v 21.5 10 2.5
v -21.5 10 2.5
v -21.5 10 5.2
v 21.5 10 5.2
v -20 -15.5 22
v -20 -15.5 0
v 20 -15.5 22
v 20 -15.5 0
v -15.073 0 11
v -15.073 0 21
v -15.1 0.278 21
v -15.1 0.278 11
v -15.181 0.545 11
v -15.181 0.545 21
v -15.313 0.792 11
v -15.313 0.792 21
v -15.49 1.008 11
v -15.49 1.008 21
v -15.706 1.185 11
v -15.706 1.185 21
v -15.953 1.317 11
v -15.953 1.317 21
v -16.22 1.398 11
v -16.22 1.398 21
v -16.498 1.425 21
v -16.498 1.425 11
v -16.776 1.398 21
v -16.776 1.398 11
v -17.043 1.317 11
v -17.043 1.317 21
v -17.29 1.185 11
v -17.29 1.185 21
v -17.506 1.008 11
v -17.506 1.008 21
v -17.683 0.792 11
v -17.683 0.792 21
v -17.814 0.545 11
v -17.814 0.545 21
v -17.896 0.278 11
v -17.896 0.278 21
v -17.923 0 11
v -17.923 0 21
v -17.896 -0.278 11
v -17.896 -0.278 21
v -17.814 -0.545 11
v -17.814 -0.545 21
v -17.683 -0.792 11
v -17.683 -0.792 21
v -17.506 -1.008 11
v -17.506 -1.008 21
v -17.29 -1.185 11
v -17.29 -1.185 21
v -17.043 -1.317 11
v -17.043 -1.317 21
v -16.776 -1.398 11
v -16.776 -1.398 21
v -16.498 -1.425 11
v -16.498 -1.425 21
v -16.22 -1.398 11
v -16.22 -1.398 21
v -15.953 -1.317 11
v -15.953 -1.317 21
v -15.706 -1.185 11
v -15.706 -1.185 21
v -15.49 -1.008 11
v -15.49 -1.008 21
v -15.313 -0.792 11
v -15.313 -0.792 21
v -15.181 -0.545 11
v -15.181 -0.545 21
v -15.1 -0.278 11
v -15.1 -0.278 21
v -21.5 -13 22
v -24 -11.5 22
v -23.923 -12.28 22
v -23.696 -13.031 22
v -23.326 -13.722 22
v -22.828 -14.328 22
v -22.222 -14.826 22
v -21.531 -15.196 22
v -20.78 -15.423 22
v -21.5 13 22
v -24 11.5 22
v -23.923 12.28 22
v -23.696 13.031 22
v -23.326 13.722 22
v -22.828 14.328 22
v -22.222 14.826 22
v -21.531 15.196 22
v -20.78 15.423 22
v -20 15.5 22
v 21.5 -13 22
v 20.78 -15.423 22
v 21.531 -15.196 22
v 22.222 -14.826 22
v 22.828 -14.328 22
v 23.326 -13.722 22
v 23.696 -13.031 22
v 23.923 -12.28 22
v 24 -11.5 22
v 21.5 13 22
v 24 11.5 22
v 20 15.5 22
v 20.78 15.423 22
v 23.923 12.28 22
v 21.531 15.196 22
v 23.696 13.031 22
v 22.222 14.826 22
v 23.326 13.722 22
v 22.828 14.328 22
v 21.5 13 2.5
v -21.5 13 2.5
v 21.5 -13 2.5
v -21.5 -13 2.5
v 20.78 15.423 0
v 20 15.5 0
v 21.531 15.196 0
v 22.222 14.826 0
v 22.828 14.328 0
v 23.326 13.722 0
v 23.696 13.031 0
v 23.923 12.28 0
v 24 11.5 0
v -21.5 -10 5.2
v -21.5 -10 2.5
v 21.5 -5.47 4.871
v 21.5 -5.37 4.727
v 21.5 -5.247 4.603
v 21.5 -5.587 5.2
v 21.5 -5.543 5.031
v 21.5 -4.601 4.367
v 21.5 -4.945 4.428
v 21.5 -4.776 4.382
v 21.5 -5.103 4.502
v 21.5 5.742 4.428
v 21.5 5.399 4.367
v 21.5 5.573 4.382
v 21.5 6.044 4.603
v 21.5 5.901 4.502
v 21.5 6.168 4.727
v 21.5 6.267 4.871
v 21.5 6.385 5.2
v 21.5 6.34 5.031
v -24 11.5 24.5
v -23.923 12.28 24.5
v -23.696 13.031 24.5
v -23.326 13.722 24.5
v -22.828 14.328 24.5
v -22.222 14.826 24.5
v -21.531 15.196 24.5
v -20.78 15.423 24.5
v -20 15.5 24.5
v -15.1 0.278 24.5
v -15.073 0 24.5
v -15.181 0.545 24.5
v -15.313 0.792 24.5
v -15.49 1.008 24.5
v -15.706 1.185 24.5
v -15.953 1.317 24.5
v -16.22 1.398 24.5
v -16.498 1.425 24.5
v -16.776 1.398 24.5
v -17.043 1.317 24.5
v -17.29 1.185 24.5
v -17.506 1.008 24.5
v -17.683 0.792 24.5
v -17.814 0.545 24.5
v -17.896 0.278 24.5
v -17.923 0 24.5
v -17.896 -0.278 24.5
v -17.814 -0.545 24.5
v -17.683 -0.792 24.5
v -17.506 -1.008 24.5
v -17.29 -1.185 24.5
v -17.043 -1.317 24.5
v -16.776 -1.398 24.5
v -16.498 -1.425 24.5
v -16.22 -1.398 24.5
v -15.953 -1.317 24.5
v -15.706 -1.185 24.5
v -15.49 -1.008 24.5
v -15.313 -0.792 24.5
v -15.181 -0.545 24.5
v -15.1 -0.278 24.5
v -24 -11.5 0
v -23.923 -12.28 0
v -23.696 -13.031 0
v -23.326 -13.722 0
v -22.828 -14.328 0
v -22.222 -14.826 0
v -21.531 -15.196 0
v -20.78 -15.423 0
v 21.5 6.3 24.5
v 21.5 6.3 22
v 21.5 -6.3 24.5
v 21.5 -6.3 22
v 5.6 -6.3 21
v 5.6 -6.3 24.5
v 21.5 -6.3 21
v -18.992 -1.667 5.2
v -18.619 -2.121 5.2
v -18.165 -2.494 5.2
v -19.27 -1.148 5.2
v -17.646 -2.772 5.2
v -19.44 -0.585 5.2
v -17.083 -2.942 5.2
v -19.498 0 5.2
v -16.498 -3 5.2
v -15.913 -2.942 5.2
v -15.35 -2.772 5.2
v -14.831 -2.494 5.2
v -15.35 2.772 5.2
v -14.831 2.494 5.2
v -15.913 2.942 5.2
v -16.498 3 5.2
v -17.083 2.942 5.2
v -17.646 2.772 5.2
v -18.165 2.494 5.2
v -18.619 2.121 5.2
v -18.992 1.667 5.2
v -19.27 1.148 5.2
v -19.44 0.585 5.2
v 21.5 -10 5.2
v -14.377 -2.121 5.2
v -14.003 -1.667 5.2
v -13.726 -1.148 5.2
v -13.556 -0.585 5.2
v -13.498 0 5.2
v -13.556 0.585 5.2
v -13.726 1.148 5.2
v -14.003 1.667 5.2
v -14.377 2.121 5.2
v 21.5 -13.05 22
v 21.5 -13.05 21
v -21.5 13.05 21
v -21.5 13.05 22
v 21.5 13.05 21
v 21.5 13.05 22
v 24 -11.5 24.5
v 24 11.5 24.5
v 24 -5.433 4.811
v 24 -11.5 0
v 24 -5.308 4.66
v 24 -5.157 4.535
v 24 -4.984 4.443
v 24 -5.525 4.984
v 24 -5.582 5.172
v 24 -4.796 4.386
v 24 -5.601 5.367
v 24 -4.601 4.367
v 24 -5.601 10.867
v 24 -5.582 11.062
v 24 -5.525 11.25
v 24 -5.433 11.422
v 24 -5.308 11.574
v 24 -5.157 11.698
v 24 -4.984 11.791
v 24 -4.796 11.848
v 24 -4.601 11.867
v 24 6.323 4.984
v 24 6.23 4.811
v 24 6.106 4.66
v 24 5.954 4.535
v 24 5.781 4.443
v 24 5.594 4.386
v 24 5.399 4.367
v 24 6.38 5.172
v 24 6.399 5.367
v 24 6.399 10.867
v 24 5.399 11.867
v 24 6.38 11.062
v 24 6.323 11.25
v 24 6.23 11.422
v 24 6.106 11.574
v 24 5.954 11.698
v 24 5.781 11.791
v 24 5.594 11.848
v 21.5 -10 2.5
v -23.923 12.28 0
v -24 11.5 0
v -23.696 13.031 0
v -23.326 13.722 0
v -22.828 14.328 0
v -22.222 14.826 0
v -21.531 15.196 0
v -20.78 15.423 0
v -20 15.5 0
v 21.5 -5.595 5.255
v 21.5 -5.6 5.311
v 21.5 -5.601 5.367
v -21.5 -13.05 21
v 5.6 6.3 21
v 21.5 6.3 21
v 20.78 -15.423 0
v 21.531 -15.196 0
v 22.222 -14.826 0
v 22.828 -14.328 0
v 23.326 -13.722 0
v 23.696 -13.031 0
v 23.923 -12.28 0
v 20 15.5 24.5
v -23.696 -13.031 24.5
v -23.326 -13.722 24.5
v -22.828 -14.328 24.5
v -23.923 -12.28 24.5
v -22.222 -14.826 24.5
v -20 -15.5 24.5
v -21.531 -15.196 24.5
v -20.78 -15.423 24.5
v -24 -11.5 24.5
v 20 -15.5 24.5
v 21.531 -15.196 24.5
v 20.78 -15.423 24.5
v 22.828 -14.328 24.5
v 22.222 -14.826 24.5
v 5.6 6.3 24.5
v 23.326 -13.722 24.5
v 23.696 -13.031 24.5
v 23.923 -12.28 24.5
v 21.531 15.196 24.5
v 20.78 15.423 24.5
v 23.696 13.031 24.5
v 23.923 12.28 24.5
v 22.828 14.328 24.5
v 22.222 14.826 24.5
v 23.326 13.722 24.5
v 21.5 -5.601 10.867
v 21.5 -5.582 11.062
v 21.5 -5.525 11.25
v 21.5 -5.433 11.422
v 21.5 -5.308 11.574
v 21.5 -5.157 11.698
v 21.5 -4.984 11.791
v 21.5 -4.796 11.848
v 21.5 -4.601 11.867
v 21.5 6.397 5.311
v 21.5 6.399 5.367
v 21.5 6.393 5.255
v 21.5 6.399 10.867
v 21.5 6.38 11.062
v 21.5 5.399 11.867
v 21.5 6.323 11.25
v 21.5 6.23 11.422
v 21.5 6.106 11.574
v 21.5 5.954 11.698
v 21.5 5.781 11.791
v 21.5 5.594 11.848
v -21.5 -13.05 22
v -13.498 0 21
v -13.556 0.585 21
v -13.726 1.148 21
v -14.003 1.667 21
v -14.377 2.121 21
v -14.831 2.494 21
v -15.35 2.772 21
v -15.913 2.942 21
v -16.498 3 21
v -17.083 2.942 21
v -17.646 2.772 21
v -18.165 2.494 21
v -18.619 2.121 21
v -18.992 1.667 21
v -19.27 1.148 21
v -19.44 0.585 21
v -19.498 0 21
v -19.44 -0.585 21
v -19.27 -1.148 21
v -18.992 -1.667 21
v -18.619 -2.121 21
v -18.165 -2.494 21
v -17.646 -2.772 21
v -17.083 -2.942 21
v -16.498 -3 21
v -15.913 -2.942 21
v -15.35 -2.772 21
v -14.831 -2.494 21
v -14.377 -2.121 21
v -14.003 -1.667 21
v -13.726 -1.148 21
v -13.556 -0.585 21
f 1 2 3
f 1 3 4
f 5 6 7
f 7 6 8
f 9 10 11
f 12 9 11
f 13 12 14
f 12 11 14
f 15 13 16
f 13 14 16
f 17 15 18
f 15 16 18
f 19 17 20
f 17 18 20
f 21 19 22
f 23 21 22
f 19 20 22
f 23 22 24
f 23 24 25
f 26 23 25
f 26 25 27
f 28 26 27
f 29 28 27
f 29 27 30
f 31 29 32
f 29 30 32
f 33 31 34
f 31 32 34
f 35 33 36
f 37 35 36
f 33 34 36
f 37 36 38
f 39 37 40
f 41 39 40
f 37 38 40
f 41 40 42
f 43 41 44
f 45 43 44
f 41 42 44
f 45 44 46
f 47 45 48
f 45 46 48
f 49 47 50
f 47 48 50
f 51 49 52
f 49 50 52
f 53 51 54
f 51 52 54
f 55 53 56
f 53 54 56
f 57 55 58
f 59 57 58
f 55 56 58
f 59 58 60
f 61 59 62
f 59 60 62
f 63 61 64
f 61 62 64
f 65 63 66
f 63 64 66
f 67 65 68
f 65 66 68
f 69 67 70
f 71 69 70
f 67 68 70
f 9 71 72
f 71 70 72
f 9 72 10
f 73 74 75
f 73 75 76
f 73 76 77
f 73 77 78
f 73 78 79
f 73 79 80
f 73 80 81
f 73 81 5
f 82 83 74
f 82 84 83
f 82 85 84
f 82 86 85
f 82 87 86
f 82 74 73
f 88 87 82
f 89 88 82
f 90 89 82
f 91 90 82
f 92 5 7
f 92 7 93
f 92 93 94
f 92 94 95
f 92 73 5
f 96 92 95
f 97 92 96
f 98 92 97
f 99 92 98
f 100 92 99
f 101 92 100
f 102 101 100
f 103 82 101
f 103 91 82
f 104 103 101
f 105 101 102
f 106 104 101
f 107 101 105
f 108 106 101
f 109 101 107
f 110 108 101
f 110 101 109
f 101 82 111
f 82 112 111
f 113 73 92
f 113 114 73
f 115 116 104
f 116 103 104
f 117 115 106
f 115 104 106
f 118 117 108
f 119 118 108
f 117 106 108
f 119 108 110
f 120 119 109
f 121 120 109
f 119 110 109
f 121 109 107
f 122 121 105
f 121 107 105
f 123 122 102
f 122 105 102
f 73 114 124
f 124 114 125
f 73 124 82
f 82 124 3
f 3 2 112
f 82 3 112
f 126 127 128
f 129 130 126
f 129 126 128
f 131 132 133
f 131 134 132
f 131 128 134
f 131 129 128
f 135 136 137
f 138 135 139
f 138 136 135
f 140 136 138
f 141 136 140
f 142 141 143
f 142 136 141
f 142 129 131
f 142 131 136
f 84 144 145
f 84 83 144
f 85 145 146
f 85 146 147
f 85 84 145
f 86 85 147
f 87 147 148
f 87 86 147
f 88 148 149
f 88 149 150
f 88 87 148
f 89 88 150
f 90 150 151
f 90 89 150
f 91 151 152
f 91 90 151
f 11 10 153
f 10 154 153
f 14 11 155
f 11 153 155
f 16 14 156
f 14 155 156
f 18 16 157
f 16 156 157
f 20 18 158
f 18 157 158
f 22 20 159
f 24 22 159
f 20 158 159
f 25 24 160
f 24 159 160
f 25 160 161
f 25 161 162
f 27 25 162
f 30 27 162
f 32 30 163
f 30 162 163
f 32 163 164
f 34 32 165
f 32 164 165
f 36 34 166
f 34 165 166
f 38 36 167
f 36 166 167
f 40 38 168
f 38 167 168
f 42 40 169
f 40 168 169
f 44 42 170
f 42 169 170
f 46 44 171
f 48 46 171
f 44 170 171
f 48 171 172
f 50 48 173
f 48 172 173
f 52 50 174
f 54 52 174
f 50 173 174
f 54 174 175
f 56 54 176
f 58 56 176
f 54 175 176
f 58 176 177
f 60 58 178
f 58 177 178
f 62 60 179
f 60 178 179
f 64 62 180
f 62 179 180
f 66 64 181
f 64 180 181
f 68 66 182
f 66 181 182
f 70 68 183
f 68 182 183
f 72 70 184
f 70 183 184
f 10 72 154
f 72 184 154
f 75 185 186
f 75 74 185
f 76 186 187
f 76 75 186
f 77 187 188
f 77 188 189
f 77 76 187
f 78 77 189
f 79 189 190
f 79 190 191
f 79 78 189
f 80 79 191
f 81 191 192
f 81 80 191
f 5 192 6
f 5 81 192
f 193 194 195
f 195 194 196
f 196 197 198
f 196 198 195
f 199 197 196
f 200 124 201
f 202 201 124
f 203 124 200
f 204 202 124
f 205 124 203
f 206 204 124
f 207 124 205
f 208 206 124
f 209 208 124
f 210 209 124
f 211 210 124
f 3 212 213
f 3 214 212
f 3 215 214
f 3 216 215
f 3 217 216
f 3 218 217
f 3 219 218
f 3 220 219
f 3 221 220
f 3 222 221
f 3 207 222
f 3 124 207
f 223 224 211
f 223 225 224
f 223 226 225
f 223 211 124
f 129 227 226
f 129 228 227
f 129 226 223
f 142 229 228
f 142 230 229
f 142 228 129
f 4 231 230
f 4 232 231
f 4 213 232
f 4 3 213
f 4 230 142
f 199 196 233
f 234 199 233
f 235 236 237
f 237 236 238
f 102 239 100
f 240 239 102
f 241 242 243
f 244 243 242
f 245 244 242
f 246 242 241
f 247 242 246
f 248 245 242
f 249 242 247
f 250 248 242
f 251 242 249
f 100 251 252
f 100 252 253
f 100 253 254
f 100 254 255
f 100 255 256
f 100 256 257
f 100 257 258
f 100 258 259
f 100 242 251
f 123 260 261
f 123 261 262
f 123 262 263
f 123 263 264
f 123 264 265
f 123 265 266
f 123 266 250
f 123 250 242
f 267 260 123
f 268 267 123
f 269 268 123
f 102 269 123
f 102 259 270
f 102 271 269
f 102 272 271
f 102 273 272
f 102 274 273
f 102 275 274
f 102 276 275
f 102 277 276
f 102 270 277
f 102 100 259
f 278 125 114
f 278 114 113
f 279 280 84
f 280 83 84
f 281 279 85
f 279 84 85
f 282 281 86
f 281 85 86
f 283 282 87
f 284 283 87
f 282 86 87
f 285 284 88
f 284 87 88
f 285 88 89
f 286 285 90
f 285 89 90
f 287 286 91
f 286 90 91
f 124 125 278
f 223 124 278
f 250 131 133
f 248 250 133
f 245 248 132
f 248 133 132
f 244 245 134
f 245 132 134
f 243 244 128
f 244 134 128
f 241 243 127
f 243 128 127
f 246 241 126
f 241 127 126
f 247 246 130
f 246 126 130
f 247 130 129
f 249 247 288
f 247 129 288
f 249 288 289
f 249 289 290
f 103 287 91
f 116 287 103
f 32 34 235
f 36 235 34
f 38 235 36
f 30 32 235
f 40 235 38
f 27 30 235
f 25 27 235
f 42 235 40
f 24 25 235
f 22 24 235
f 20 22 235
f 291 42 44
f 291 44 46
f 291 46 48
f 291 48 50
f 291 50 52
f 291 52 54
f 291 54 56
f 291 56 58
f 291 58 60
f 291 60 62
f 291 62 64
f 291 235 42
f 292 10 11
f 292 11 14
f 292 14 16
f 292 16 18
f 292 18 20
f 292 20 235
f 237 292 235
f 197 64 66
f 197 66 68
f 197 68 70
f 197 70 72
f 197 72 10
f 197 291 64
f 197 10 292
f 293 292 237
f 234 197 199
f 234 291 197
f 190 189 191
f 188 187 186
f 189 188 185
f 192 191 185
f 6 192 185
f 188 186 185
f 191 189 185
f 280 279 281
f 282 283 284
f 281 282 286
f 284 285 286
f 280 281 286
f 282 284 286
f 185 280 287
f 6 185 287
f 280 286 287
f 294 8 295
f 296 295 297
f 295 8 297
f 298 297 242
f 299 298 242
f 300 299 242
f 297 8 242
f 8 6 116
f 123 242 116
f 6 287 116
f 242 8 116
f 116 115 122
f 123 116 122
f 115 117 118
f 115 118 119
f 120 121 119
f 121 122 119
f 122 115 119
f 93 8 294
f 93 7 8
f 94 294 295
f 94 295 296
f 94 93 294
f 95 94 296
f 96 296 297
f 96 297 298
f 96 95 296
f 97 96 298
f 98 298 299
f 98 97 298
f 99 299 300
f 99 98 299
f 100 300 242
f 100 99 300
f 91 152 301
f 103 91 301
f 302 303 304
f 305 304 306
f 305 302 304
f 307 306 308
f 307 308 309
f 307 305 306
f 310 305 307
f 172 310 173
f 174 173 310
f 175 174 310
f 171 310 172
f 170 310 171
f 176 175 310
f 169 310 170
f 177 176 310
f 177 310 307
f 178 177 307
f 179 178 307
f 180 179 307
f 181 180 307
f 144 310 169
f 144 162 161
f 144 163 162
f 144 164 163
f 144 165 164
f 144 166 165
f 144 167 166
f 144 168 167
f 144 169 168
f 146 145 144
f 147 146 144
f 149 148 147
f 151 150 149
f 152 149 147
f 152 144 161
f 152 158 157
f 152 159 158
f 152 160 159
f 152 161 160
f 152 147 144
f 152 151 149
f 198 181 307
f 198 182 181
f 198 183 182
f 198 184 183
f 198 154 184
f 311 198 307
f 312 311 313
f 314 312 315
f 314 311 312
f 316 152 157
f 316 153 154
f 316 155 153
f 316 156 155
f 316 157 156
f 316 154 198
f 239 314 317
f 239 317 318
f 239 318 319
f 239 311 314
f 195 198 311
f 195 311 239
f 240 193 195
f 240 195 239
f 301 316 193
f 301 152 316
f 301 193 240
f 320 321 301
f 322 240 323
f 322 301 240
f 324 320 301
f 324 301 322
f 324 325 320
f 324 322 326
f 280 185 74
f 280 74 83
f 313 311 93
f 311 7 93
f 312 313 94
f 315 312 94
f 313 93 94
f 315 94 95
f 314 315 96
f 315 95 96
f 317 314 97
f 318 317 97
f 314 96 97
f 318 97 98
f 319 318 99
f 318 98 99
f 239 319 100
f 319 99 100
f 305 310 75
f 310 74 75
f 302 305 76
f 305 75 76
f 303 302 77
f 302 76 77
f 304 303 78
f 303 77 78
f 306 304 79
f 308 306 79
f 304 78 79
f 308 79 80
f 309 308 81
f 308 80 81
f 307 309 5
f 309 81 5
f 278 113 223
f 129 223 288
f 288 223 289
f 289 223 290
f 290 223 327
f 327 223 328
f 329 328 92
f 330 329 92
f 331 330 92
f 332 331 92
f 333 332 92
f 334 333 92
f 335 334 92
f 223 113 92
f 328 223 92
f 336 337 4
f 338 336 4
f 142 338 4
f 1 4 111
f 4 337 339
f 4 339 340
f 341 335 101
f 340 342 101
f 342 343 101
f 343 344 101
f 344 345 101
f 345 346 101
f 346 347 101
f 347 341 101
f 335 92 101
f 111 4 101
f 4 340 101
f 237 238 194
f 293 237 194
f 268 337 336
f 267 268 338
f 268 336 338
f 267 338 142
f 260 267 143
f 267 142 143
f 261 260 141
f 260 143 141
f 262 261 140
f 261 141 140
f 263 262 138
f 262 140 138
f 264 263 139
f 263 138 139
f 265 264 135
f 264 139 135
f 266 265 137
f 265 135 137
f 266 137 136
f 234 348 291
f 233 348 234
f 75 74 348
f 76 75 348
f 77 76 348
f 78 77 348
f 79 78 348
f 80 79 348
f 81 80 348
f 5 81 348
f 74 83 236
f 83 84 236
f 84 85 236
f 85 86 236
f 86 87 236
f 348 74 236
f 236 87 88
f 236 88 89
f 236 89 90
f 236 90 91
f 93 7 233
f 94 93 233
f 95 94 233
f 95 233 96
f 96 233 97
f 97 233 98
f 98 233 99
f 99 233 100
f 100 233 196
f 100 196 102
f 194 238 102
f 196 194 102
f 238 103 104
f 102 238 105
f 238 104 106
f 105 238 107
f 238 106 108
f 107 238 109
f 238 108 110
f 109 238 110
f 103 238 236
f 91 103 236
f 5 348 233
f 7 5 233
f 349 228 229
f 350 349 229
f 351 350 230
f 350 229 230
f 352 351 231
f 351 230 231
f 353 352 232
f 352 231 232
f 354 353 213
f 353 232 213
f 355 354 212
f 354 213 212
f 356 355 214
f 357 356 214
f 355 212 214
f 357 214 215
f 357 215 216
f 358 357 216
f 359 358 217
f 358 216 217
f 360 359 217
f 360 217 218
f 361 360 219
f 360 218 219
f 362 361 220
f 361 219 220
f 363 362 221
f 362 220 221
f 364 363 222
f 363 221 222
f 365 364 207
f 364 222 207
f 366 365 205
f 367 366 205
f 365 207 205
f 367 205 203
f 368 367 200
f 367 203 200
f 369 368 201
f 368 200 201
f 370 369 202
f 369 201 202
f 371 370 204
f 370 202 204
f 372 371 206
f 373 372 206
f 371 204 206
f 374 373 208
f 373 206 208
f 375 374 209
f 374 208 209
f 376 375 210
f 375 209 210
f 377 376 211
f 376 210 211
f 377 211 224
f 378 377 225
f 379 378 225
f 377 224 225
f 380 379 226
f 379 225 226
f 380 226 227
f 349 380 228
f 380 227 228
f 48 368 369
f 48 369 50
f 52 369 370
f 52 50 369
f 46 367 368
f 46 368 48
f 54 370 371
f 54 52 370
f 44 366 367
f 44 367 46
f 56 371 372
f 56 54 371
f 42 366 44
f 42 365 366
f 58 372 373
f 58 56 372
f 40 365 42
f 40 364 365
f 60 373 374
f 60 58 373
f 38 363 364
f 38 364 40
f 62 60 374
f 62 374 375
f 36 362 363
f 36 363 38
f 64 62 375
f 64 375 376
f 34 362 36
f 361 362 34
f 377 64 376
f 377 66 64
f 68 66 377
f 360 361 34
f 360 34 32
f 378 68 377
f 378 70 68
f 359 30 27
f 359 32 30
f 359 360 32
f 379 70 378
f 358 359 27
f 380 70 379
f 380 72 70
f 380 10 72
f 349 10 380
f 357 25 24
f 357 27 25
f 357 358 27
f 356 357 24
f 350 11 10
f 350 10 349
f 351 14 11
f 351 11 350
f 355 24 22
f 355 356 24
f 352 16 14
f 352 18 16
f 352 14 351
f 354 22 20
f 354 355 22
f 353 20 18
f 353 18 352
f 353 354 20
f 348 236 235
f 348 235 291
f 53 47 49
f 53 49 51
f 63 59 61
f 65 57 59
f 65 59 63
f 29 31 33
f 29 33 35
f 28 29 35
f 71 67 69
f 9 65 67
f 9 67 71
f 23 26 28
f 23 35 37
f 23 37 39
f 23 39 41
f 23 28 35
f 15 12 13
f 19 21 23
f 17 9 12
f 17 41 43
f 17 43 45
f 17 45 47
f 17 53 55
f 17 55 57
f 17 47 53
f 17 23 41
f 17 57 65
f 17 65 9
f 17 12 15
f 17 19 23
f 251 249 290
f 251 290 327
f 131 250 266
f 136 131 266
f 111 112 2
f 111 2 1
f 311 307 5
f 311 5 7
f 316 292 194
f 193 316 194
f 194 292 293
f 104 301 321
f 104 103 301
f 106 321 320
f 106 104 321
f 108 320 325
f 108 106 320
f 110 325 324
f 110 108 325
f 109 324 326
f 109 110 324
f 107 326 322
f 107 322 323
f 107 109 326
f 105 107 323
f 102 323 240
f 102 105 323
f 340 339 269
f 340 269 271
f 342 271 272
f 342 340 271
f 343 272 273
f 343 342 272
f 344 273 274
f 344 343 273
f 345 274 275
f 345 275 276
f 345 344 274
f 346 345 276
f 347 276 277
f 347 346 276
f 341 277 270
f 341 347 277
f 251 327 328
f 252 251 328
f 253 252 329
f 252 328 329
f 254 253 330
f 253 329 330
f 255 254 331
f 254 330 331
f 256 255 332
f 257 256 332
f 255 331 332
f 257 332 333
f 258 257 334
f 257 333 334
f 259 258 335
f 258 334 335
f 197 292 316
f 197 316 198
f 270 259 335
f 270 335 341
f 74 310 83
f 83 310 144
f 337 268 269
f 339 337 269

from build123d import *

# Parameters (mm, degrees)
F0_W           = 48
F0_H           = 31
F1_DEPTH       = 22
F2_T           = -2.5
F3_W           = 43
F3_H           = 20
F4_DEPTH       = 2.7
F6_W           = 48
F6_H           = 31
F7_DEPTH       = 2.5
F8_W           = 43
F8_H           = 26.1
F9_DEPTH       = 1
F10_W          = 15.9
F10_H          = 12.6
F11_DEPTH      = 3.5
F12_R          = 4
F12_2_R        = 4
F13_W          = 12
F13_H          = 7.5
F14_DEPTH      = 2.5
F15_T1_DEPTH   = 2.5
F16_R          = 3
F17_DEPTH      = 15.8
F18_R          = 1.425
F19_DEPTH      = 3.5
F19_DEPTH_BACK = 10


# Not quite as in the source:
# - a fillet or chamfer that OpenCascade refuses, or shapes differently, is made with other operations: its cross-section is extruded or revolved along the edge and cut away or added


with BuildPart() as f1:
    # F0 (on Top) → F1 (new body)
    with BuildSketch(Plane.XY):
        Rectangle(F0_W, F0_H)
    extrude(amount=F1_DEPTH)

    # F2
    f2_openings = [f1.faces().sort_by_distance(p)[0] for p in [
        (0, 0, 22),
    ]]
    offset(amount=F2_T, openings=f2_openings)

    # F3 (on face) → F4 (join)
    with BuildSketch(Plane.XY.offset(2.5)):
        Rectangle(F3_W, F3_H)
    extrude(amount=F4_DEPTH)

    # F12
    f12_edges = [f1.edges().sort_by_distance(p)[0] for p in [
        (24, -15.5, 11),
        (-24, -15.5, 11),
        (-24, 15.5, 11),
        (24, 15.5, 11),
    ]]
    fillet(f12_edges, radius=F12_R)

    # F13 (on face) → F14 (cut, through all)
    with BuildSketch(Plane.YZ.offset(24)):
        with Locations((0.3987657316, 8.116890993)):
            Rectangle(F13_W, F13_H)
    extrude(amount=-F14_DEPTH, mode=Mode.SUBTRACT)

    # F15: fillet of radius 1 on 4 edges, made by hand

    # F15_s2 → F15_t1 (join)
    with BuildSketch(Plane.YZ.offset(21.5)):
        with BuildLine():
            ThreePointArc((-4.6012342684, 4.366890993), (-5.3083410496, 4.6597842118), (-5.6012342684, 5.366890993))
            Line((-5.6012342684, 5.366890993), (-5.6012342684, 4.366890993))
            Line((-5.6012342684, 4.366890993), (-4.6012342684, 4.366890993))
        make_face()
        with BuildLine():
            ThreePointArc((6.3987657316, 5.366890993), (6.1058725128, 4.6597842118), (5.3987657316, 4.366890993))
            Line((5.3987657316, 4.366890993), (6.3987657316, 4.366890993))
            Line((6.3987657316, 4.366890993), (6.3987657316, 5.366890993))
        make_face()
        with BuildLine():
            ThreePointArc((6.3987657316, 10.866890993), (6.1058725128, 11.5739977742), (5.3987657316, 11.866890993))
            Line((5.3987657316, 11.866890993), (6.3987657316, 11.866890993))
            Line((6.3987657316, 11.866890993), (6.3987657316, 10.866890993))
        make_face()
        with BuildLine():
            ThreePointArc((-5.6012342684, 10.866890993), (-5.3083410496, 11.5739977742), (-4.6012342684, 11.866890993))
            Line((-4.6012342684, 11.866890993), (-5.6012342684, 11.866890993))
            Line((-5.6012342684, 11.866890993), (-5.6012342684, 10.866890993))
        make_face()
    extrude(amount=F15_T1_DEPTH)

    # F16 (on face) → F17 (join, through all)
    with BuildSketch(Plane.XY.offset(5.2)):
        with Locations((-16.4979076515, 0)):
            Circle(F16_R)
    extrude(amount=F17_DEPTH)


with BuildPart() as f7:
    # F6 (on offset) → F7 (new body)
    with BuildSketch(Plane.XY.offset(24.5)):
        Rectangle(F6_W, F6_H)
    extrude(amount=-F7_DEPTH)

    # F8 (on face) → F9 (join)
    with BuildSketch(Plane(origin=(0, 0, 22), x_dir=(1, 0, 0), z_dir=(0, 0, -1))):
        Rectangle(F8_W, F8_H)
    extrude(amount=F9_DEPTH)

    # F10 (on face) → F11 (cut, through all)
    with BuildSketch(Plane(origin=(0, 0, 21), x_dir=(1, 0, 0), z_dir=(0, 0, -1))):
        with Locations((13.55, 0)):
            Rectangle(F10_W, F10_H)
    extrude(amount=-F11_DEPTH, mode=Mode.SUBTRACT)

    # F12#2
    f12_2_edges = [f7.edges().sort_by_distance(p)[0] for p in [
        (24, -15.5, 23.25),
        (24, 15.5, 23.25),
        (-24, -15.5, 23.25),
        (-24, 15.5, 23.25),
    ]]
    fillet(f12_2_edges, radius=F12_2_R)


with BuildPart() as f19_tool:
    # F18 (on face) → F19 (new body, two sides)
    with BuildSketch(Plane.XY.offset(21)) as f19_sk:
        with Locations((-16.4979076515, 0)):
            Circle(F18_R)
    extrude(amount=F19_DEPTH)
    extrude(f19_sk.sketch, amount=-F19_DEPTH_BACK)


with BuildPart() as f1_1:
    add(f1.part)

    # F19: cut by f19_tool
    add(f19_tool.part, mode=Mode.SUBTRACT)


with BuildPart() as f7_1:
    add(f7.part)

    # F19: cut by f19_tool
    add(f19_tool.part, mode=Mode.SUBTRACT)


solid = Compound([f1_1.part, f7_1.part])
